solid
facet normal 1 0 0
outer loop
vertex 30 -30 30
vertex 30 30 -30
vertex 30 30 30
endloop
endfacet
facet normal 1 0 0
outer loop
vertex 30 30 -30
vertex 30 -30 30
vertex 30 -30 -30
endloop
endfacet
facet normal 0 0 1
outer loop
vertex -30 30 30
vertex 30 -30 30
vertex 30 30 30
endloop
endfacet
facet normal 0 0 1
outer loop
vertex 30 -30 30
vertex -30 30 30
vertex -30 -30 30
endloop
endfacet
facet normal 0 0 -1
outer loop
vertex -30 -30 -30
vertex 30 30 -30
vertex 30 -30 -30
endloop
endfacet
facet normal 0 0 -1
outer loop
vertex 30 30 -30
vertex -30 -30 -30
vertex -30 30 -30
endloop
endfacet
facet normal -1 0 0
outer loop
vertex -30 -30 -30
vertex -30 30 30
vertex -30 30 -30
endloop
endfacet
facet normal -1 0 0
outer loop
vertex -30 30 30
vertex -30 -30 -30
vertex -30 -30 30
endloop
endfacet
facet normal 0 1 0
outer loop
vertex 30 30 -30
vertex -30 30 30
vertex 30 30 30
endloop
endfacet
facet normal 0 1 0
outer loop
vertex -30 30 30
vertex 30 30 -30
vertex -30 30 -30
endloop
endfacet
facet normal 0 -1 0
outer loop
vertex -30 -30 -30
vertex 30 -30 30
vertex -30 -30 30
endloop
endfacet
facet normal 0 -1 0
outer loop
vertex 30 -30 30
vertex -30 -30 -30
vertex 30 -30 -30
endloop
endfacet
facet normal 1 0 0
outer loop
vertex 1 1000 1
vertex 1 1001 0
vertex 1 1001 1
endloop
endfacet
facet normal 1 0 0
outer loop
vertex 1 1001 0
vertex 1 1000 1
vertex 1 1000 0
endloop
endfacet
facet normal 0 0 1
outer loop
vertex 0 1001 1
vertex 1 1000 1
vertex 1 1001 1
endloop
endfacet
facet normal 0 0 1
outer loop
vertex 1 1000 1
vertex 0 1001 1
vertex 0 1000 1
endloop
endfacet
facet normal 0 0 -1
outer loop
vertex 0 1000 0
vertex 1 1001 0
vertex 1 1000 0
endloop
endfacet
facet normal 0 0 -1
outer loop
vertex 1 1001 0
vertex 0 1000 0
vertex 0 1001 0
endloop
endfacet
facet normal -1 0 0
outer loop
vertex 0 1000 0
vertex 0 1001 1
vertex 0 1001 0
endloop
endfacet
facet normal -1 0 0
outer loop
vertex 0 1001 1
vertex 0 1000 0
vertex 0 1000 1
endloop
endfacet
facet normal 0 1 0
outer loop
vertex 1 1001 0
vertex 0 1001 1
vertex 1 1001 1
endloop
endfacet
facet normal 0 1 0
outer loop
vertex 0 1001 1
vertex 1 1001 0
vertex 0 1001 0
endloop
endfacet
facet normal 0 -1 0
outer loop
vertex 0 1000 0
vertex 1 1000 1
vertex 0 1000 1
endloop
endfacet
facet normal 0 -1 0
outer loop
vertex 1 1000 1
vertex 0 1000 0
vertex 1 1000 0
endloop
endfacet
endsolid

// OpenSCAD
// The depth range must be centered on the viewport's center of rotation, not on
// the model's bounding box.
//
// A cube on the rotation center, and one small cube a thousand units away so the
// bounding box is enormous and its center is nowhere near either object. The
// centered cube sits where the camera orbits, so its distance from the eye never
// changes and neither may its shade - from any angle, in either of the two views
// below. A cube rather than a sphere because its faces are flat: every pixel of a
// face is at an exactly determined depth, so a drift of even one grey level is a
// real change rather than resampling noise on a curved silhouette.
//
// Rendered against separate expected images rather than a shared one, because the
// far cube genuinely moves between these angles.
//
// It cannot be otherwise, and the reason is worth writing down. Whole-image
// identity under a rotation needs the scene to be invariant under it, which pins
// the bounding box center on the rotation axis - and then the eye-to-box-center
// distance does not change either, so the very bug this model exists to catch
// becomes invisible. Discrimination and exact identity cannot come from the same
// pair of views. depthmap-orbit-symmetry takes the identity half on a symmetric
// scene; this file takes the discriminating half. When the range was centered on
// the bounding box, the centered object here rendered blown out to pure white
// from one angle and clamped to invisible from another.
cube(60, center = true);
translate([0, 1000, 0]) cube();
